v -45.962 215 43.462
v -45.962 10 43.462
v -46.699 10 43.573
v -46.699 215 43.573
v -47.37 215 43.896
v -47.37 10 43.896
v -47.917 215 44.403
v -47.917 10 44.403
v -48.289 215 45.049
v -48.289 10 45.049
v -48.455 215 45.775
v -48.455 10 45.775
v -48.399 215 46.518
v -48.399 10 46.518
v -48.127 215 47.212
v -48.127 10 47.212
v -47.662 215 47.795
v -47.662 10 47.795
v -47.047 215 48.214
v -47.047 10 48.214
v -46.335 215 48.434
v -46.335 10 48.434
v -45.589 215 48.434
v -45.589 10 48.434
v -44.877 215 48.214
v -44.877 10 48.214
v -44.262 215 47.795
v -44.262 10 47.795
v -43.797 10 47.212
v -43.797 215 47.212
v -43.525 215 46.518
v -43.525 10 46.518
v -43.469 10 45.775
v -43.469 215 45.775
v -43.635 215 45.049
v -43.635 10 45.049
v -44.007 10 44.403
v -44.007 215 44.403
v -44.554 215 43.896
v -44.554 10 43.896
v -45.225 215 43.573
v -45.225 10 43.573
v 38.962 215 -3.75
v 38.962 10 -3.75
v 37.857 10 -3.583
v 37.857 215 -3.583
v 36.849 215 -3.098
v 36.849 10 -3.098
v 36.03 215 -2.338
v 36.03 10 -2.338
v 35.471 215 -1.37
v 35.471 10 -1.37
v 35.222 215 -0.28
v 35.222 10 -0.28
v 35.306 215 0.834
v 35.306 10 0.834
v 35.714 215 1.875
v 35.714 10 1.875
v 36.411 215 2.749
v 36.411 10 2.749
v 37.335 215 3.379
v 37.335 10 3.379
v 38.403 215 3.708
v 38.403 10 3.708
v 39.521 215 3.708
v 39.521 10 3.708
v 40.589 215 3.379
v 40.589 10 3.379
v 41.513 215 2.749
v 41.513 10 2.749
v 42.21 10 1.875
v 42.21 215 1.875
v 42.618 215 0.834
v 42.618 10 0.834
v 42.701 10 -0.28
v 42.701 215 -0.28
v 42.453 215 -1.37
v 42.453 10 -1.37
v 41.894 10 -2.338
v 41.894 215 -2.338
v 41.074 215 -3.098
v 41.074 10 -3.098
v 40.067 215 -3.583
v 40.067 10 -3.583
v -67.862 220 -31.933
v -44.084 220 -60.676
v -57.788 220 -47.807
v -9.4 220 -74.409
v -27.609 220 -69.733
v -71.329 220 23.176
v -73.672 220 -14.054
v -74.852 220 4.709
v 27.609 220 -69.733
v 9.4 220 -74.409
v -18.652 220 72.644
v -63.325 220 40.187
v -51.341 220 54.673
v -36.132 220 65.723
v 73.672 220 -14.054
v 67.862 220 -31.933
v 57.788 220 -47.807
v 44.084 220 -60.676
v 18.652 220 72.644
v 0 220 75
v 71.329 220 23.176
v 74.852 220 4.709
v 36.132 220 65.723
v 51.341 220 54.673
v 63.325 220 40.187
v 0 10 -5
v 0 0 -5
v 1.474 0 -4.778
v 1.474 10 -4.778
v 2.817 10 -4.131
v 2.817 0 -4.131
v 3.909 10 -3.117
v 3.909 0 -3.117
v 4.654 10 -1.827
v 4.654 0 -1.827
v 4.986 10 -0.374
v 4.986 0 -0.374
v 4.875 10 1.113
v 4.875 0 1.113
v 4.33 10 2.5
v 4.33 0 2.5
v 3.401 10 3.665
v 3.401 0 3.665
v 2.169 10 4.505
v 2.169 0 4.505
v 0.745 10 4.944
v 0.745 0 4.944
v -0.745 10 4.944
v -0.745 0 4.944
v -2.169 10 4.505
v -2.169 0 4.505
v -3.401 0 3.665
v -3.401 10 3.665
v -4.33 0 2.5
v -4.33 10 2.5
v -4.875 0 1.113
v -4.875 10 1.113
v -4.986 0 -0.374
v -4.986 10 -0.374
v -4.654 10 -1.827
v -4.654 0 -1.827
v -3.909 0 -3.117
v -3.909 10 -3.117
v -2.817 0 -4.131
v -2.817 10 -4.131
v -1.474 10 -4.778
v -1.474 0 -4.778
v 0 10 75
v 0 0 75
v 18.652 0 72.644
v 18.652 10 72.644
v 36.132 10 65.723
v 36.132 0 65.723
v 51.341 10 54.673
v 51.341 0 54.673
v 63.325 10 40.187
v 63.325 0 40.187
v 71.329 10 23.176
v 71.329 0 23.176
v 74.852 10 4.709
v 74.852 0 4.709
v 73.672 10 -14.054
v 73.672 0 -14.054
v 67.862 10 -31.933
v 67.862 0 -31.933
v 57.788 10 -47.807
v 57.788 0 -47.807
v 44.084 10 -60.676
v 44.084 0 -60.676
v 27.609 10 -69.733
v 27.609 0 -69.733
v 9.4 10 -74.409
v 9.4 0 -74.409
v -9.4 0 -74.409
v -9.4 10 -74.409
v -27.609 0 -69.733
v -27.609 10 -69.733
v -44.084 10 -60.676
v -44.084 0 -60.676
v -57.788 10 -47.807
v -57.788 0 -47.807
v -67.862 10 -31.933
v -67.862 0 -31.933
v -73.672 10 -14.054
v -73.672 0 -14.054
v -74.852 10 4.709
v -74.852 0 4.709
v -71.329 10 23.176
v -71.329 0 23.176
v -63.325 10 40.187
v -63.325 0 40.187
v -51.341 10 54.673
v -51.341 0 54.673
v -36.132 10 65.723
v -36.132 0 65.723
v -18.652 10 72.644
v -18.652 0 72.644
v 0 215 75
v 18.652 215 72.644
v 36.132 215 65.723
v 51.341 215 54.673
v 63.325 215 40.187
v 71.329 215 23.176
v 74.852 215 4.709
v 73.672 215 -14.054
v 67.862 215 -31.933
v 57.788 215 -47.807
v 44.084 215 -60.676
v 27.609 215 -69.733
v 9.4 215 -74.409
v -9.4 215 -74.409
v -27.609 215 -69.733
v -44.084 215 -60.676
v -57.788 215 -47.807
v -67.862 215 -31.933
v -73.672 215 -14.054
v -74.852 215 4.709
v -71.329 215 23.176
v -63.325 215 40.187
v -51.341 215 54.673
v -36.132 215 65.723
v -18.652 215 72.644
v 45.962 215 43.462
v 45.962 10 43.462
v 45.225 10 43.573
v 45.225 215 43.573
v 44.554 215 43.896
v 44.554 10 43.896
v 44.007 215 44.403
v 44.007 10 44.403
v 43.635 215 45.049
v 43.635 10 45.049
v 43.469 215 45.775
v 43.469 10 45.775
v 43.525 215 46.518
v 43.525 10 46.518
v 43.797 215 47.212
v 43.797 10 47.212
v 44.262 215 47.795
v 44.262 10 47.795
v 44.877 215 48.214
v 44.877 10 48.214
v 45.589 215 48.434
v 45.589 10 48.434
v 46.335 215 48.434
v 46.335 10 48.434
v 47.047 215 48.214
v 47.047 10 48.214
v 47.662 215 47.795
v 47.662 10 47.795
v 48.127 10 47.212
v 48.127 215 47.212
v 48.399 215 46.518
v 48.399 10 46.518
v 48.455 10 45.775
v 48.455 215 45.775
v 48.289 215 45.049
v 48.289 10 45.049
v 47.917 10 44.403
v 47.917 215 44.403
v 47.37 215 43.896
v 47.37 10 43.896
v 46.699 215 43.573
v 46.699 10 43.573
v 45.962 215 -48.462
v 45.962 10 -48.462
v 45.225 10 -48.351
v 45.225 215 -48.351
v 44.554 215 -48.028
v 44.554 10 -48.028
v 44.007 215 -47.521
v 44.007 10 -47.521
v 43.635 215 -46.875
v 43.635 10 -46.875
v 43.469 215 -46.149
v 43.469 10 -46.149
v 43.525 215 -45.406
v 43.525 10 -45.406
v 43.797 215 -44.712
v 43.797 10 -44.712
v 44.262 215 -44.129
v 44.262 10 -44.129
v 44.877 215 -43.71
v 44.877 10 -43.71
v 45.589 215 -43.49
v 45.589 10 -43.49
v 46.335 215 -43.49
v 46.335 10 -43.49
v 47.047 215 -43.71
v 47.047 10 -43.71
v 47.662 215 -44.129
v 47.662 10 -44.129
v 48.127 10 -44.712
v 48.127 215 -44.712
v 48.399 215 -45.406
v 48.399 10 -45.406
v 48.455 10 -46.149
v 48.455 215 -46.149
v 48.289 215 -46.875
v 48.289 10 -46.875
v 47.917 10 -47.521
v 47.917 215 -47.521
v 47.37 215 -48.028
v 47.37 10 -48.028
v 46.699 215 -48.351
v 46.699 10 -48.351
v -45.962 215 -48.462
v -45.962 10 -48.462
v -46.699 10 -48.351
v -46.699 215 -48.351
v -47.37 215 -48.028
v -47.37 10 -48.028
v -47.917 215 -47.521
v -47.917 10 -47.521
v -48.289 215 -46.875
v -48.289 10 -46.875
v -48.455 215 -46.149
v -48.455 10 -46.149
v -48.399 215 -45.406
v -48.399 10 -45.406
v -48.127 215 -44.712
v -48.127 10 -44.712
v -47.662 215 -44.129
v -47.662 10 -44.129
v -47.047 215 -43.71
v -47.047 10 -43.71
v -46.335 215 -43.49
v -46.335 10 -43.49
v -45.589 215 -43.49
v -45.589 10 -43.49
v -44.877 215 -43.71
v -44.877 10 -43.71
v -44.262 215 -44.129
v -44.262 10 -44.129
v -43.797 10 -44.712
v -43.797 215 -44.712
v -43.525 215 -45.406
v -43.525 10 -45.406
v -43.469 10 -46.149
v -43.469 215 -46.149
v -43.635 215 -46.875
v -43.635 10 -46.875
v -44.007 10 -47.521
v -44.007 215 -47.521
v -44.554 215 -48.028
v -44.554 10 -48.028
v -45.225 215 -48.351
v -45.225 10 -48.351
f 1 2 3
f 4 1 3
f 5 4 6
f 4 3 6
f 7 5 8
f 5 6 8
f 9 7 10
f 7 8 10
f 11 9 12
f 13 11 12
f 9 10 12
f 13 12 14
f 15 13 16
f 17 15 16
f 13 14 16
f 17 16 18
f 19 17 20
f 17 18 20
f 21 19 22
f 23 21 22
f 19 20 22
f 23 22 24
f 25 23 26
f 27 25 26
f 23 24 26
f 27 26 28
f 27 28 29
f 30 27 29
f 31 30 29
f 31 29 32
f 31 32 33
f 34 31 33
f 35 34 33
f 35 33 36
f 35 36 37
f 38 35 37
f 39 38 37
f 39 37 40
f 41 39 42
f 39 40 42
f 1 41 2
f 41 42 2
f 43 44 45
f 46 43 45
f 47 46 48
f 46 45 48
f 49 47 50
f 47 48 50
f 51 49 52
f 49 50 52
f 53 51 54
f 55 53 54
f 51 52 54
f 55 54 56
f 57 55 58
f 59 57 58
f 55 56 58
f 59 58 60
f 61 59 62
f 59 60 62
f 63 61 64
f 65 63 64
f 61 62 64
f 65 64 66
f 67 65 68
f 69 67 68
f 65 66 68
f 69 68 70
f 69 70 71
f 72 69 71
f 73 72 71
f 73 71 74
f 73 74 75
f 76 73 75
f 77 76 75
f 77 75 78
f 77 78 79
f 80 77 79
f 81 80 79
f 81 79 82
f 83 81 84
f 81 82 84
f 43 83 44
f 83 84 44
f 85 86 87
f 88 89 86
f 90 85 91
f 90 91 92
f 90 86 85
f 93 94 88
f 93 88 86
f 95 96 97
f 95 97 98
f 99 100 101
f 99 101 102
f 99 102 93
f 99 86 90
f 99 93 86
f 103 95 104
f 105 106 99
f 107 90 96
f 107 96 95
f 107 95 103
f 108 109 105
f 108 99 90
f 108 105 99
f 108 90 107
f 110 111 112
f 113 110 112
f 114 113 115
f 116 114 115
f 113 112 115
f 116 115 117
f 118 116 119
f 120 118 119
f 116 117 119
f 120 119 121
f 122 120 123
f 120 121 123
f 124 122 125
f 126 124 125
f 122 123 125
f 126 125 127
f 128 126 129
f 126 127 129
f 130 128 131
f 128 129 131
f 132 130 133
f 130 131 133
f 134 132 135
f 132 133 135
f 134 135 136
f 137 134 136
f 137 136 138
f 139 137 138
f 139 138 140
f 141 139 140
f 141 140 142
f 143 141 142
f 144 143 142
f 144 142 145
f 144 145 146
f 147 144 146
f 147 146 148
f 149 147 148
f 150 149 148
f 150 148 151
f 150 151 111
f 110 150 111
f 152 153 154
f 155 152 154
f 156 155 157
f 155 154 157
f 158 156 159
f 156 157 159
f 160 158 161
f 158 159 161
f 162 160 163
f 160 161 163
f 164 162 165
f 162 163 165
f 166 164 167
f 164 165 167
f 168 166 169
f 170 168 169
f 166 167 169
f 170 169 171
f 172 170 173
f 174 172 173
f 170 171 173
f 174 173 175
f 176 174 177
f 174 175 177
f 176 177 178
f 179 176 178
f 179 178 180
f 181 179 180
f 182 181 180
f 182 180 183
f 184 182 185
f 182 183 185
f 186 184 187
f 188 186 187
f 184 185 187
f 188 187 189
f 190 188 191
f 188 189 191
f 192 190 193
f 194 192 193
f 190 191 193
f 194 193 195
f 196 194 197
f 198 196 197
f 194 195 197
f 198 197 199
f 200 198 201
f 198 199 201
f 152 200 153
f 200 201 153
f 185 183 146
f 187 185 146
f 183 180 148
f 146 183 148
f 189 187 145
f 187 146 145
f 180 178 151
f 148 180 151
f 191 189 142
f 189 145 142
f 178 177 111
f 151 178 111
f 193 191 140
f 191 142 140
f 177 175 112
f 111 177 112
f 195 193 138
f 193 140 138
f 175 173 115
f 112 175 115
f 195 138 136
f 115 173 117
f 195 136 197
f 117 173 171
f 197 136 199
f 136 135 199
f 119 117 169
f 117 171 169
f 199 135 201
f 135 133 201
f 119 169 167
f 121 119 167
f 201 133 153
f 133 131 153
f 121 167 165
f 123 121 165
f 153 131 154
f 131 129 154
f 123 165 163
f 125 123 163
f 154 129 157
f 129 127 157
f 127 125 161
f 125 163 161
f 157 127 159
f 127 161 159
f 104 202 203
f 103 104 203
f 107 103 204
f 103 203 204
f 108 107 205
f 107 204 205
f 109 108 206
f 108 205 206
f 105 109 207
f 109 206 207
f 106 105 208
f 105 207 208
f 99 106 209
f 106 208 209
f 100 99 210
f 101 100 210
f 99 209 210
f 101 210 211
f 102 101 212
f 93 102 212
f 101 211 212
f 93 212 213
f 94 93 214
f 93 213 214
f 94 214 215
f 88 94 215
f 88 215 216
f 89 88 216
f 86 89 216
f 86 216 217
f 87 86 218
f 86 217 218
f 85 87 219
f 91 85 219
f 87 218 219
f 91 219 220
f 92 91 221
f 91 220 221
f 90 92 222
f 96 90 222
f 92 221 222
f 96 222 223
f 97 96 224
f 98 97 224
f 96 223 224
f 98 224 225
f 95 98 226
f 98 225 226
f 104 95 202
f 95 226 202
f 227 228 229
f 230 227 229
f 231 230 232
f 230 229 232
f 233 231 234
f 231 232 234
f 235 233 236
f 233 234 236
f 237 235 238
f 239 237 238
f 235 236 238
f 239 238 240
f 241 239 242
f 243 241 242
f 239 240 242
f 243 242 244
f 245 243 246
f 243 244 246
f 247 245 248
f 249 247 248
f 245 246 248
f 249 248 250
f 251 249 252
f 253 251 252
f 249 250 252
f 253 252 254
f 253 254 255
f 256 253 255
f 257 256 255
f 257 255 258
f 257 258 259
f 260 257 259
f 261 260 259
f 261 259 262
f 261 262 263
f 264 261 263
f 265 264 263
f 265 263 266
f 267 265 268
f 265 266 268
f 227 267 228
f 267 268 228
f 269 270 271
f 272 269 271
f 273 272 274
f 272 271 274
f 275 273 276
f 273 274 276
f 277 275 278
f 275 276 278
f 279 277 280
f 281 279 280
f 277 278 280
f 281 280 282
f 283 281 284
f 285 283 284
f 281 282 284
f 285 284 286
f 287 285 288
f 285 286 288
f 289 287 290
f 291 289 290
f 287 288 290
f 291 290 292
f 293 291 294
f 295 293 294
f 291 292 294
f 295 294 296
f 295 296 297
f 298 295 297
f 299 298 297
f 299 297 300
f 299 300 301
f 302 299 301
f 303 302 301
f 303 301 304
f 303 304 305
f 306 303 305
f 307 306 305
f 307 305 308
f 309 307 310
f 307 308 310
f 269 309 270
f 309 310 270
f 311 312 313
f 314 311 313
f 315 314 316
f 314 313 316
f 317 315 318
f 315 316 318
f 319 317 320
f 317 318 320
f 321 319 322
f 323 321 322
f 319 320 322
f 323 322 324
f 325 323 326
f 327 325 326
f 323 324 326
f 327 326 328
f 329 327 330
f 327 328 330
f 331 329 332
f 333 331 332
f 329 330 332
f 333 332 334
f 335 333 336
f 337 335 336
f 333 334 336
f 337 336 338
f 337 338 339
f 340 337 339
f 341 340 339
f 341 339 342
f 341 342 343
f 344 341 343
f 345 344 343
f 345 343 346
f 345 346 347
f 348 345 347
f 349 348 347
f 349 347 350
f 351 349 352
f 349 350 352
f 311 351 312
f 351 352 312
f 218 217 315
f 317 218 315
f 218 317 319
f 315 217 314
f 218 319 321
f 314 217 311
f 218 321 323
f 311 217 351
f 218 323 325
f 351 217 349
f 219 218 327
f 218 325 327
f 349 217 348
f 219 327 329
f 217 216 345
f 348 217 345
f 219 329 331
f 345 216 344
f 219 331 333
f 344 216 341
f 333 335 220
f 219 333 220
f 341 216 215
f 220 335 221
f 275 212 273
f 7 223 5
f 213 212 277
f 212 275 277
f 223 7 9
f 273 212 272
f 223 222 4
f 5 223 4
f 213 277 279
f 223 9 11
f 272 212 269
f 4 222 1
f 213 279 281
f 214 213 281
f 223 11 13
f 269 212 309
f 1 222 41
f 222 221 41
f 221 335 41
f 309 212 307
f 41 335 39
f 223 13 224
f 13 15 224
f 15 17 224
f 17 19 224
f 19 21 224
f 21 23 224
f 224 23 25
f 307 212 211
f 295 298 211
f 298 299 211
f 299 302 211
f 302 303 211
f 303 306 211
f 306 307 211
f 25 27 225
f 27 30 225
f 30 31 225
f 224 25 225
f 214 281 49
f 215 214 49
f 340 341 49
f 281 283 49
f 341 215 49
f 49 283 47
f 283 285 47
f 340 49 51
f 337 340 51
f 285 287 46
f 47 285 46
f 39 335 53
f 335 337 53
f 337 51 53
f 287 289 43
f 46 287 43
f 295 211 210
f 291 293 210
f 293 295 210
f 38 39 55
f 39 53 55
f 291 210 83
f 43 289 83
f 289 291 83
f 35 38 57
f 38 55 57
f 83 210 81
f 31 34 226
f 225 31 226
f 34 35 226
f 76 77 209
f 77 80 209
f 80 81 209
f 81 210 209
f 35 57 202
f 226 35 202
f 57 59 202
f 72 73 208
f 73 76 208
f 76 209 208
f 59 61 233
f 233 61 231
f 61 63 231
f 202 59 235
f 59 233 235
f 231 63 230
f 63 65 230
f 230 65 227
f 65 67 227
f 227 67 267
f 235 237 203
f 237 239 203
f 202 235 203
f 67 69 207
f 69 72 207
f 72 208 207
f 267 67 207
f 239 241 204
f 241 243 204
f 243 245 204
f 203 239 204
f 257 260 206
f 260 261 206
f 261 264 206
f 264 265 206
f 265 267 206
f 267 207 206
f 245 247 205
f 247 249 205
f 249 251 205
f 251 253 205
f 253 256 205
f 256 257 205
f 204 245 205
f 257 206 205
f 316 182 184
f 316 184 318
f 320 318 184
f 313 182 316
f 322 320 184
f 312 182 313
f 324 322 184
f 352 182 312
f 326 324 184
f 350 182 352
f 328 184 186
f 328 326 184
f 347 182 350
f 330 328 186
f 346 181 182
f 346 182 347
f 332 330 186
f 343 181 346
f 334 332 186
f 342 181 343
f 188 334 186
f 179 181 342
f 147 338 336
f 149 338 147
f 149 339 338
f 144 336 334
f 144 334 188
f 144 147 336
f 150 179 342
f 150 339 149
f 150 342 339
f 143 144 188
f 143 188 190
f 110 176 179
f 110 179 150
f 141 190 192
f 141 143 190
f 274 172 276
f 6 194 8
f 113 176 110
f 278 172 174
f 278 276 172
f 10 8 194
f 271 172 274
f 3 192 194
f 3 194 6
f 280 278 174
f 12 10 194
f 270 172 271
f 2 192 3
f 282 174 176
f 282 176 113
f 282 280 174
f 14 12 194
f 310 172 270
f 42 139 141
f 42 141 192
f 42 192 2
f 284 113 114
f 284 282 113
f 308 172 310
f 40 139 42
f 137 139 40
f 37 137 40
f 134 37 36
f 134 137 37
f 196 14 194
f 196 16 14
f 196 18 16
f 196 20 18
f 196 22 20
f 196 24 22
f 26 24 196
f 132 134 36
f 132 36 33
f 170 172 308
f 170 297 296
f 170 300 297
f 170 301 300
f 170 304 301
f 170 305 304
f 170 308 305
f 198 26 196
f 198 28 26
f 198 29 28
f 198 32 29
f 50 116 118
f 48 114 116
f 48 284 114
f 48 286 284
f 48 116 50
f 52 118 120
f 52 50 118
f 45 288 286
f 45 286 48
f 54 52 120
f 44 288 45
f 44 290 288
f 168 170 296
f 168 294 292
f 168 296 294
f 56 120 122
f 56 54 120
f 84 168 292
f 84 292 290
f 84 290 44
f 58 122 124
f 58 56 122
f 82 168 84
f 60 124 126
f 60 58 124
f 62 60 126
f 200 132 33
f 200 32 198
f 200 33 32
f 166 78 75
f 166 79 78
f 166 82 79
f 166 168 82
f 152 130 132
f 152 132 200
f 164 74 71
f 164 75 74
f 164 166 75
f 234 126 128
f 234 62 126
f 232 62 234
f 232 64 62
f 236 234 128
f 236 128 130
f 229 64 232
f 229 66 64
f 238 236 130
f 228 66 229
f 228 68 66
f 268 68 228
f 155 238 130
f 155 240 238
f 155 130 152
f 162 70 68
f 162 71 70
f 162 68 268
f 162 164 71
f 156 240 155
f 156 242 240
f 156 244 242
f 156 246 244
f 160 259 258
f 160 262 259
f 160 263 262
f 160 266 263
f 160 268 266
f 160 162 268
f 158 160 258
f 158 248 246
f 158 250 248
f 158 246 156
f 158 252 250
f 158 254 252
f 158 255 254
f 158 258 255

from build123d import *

# Parameters (mm, degrees)
SKETCH1_R           = 75
BOSS_EXTRUDE1_DEPTH = 10
SKETCH2_R           = 2.5
SKETCH2_R_2         = 3.75
BOSS_EXTRUDE2_DEPTH = 205
SKETCH3_R           = 75
BOSS_EXTRUDE3_DEPTH = 5
CUT_EXTRUDE1_REACH  = 246.233
SKETCH4_R           = 5


with BuildPart() as part:
    # Sketch1 → Boss-Extrude1 (new body)
    with BuildSketch(Plane(origin=(0, 0, 0), x_dir=(1, 0, 0), z_dir=(0, 1, 0))):
        with Locations(Location((0, 0, 0), (0, 0, 270))):
            Circle(SKETCH1_R)
    extrude(amount=BOSS_EXTRUDE1_DEPTH)

    # Sketch2 → Boss-Extrude2 (add)
    with BuildSketch(Plane(origin=(0, 10, 0), x_dir=(1, 0, 0), z_dir=(0, 1, 0))):
        with Locations(Location((-45.961940777, 45.961940777, 0), (0, 0, 90))):
            Circle(SKETCH2_R)
        with Locations(Location((45.961940777, 45.961940777, 0), (0, 0, 90))):
            Circle(SKETCH2_R)
        with Locations(Location((45.961940777, -45.961940777, 0), (0, 0, 90))):
            Circle(SKETCH2_R)
        with Locations(Location((-45.961940777, -45.961940777, 0), (0, 0, 90))):
            Circle(SKETCH2_R)
        with Locations(Location((38.961940777, 0, 0), (0, 0, 90))):
            Circle(SKETCH2_R_2)
    extrude(amount=BOSS_EXTRUDE2_DEPTH)

    # Sketch3 → Boss-Extrude3 (add)
    with BuildSketch(Plane(origin=(0, 215, 0), x_dir=(1, 0, 0), z_dir=(0, 1, 0))):
        with Locations(Location((0, 0, 0), (0, 0, 270))):
            Circle(SKETCH3_R)
    extrude(amount=BOSS_EXTRUDE3_DEPTH)

    # Sketch4 → Cut-Extrude1 (cut, up to next)
    with BuildSketch(Plane.XZ, mode=Mode.PRIVATE) as cut_extrude1_sk1:
        with Locations(Location((0, 0, 0), (0, 0, 270))):
            Circle(SKETCH4_R)
    cut_extrude1_tool1 = extrude(cut_extrude1_sk1.sketch, amount=-CUT_EXTRUDE1_REACH, mode=Mode.PRIVATE) & part.part
    add(cut_extrude1_tool1.solids().sort_by_distance((0, 0, 0))[0], mode=Mode.SUBTRACT)


solid = part.part
